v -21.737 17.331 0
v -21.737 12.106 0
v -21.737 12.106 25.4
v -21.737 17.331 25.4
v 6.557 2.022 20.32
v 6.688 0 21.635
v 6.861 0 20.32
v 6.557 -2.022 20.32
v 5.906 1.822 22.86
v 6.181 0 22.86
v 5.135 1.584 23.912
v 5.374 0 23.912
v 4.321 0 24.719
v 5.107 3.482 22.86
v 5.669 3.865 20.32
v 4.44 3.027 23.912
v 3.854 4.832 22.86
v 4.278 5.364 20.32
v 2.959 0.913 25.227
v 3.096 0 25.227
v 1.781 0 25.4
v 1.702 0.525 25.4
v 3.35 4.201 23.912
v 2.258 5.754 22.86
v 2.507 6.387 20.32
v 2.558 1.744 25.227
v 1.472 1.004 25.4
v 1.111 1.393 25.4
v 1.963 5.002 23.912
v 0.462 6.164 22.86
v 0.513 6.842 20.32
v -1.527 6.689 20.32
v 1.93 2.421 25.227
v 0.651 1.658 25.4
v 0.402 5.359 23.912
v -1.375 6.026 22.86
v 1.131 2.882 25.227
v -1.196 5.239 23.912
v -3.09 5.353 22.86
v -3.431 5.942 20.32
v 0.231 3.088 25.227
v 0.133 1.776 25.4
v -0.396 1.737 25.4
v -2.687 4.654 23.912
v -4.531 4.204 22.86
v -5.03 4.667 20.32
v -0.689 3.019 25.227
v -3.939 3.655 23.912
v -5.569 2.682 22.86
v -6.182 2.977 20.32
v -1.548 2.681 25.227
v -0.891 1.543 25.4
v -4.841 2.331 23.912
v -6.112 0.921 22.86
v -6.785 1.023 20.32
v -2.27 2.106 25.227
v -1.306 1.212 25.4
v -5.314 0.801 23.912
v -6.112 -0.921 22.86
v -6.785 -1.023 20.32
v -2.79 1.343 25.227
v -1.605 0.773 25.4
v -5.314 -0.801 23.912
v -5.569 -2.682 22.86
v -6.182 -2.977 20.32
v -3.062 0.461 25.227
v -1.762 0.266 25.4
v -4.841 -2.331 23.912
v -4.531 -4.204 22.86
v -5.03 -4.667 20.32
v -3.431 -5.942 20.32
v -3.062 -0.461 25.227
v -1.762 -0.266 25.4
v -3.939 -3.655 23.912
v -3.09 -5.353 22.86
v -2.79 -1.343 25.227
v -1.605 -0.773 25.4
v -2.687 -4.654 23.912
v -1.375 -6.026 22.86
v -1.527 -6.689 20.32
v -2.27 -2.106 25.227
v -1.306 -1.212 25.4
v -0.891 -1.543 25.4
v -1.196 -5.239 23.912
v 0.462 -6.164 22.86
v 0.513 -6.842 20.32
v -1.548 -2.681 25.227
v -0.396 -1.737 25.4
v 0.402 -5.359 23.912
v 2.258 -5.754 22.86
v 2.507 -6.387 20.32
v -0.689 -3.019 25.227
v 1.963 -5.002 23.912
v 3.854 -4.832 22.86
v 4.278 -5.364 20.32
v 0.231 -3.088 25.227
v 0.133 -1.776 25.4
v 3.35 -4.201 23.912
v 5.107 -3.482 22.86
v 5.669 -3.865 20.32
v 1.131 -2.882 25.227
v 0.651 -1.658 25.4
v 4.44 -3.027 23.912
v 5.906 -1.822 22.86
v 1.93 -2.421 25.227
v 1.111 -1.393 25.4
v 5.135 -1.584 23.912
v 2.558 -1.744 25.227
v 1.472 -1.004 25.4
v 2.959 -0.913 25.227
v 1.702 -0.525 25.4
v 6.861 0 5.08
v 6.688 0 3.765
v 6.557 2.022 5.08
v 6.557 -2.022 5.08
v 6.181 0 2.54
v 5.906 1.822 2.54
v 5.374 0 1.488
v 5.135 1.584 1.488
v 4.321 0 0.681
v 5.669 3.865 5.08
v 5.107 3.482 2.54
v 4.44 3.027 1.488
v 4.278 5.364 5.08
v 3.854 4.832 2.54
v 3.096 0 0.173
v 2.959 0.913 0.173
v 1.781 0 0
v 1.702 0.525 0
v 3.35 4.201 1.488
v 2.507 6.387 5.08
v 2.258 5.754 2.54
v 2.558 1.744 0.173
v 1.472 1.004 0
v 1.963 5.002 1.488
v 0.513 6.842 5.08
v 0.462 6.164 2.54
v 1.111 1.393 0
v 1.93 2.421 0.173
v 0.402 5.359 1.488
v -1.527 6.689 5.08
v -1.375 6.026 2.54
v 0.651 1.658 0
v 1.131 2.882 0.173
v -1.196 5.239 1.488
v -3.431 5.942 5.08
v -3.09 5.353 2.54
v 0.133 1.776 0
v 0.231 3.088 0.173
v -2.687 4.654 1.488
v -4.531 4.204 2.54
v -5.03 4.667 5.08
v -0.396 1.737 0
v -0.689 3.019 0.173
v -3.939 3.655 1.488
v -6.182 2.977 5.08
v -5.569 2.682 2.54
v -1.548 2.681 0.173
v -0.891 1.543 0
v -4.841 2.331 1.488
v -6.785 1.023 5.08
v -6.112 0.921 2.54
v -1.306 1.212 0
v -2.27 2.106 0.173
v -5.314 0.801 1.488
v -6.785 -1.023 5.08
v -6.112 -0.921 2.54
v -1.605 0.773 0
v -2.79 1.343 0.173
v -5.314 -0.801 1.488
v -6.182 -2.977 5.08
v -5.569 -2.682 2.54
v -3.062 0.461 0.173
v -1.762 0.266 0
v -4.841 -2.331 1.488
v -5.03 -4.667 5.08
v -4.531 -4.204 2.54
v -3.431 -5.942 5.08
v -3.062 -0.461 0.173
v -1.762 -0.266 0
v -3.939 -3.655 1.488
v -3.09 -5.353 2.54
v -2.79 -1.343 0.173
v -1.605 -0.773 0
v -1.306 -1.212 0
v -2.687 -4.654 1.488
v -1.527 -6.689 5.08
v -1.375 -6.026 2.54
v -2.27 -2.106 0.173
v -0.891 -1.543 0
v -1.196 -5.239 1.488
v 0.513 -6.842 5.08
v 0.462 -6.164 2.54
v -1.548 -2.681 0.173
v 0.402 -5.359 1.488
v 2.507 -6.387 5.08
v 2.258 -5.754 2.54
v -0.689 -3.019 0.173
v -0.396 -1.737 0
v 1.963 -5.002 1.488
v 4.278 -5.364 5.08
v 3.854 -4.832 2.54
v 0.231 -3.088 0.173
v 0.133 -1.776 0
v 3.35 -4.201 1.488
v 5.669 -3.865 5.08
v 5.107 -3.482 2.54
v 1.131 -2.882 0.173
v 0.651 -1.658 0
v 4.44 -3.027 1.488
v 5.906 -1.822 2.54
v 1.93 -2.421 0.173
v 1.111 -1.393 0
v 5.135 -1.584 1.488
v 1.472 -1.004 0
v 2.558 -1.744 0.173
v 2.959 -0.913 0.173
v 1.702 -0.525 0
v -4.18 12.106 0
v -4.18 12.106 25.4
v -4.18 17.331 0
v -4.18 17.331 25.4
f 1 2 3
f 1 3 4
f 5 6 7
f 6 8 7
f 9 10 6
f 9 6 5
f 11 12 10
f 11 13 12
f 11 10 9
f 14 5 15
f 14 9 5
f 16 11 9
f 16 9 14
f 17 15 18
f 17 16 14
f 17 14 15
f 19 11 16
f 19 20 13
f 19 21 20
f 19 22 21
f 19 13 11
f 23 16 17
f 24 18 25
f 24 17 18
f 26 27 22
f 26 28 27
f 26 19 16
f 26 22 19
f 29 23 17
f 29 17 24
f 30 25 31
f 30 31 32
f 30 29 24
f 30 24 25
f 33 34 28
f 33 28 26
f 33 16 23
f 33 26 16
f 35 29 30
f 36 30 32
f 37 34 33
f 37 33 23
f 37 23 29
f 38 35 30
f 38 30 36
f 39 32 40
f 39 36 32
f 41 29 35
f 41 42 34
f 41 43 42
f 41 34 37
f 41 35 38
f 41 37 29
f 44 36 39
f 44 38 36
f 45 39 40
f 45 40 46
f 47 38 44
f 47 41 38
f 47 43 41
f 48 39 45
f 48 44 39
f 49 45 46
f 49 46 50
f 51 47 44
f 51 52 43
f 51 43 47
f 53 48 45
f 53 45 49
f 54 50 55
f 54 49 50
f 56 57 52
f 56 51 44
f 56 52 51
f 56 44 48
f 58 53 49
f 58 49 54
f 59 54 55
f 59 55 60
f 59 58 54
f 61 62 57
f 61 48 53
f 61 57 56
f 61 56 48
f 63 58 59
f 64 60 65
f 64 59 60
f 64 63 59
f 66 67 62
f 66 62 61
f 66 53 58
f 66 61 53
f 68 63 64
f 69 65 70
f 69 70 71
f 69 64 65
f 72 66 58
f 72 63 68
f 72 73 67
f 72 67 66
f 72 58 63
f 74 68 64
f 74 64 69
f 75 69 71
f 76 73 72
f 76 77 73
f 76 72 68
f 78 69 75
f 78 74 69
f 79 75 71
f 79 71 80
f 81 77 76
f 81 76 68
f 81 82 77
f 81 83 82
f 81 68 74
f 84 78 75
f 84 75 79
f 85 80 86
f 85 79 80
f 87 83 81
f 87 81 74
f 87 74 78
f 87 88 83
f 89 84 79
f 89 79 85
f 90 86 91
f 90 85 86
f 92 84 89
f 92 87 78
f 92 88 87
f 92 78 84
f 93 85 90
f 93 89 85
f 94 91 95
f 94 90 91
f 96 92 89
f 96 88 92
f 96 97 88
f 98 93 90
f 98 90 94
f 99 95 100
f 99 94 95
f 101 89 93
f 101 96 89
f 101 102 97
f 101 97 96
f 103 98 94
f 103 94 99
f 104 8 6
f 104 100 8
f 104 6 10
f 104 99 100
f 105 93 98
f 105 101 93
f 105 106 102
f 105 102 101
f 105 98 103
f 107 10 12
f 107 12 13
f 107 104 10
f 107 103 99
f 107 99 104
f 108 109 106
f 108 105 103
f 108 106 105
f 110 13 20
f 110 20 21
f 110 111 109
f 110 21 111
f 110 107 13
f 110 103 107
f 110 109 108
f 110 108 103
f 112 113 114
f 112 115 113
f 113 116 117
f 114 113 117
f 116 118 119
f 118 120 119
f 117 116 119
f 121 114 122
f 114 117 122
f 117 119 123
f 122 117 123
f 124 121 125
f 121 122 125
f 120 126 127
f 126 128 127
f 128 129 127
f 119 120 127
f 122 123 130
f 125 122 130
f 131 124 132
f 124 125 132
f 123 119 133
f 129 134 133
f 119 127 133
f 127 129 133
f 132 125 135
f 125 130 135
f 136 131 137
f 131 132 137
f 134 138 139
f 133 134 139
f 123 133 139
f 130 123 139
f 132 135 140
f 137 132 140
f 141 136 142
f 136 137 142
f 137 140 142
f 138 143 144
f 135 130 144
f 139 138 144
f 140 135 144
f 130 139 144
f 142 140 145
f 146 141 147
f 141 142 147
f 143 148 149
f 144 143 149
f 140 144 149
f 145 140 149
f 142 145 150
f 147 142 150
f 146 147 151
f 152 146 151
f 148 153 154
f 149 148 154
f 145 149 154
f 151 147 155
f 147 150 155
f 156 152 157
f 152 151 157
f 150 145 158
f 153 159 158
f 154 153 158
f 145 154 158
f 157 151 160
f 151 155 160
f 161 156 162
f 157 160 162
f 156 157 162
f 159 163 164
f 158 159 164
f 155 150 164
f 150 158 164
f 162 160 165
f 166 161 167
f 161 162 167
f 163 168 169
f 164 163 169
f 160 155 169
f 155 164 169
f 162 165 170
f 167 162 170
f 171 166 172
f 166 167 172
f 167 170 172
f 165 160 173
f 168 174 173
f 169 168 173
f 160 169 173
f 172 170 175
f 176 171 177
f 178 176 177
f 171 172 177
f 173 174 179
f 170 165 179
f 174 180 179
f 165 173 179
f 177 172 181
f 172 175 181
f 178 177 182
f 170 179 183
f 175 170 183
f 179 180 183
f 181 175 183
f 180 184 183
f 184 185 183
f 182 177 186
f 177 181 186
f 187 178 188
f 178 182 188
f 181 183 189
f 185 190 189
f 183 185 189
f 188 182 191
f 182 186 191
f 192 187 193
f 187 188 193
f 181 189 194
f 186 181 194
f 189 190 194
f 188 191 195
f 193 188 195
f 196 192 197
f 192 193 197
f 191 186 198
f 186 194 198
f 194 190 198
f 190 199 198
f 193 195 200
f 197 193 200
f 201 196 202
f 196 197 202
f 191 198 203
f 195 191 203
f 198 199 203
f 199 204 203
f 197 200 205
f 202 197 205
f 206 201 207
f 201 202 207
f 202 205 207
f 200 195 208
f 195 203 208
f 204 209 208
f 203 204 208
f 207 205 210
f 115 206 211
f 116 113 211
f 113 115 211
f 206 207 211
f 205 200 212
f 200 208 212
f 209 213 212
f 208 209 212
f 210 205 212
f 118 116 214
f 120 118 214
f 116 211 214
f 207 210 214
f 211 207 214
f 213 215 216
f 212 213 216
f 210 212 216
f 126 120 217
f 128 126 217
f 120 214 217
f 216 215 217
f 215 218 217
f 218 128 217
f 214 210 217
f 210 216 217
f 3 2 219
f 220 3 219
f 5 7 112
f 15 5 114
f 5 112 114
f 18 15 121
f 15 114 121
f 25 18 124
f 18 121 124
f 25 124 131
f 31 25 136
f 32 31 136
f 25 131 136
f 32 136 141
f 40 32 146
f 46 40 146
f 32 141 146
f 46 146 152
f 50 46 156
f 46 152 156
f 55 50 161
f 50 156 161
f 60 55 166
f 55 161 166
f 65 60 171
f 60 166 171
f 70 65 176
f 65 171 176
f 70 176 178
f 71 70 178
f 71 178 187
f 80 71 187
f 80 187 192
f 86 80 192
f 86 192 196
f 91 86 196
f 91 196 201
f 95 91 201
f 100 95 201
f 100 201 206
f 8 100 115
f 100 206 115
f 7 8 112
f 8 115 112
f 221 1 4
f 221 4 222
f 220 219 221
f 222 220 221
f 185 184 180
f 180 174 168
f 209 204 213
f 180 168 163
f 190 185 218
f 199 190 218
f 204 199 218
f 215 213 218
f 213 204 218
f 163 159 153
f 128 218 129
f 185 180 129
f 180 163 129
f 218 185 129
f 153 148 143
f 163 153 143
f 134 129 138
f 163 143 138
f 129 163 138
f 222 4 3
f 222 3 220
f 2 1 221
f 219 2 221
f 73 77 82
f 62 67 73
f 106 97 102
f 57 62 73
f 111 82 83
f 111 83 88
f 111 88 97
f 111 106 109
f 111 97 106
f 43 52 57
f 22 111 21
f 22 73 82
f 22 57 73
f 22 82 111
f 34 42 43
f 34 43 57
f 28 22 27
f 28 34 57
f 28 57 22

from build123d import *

# Parameters (mm, degrees)
F1_W     = 17.5571227446
F1_H     = 5.2252039313
F2_DEPTH = 25.4
F0_R     = 6.8614235902
F3_DEPTH = 25.4
F6_R     = 5.08


# Not quite as in the source:
# - the program builds the solid bodies; features that only make, move or delete a surface that nothing else refers to are left out


with BuildPart() as f2:
    # F1 (on Top) → F2 (new body)
    with BuildSketch(Plane.XY):
        with Locations((-12.9580865614, 14.7183928639)):
            Rectangle(F1_W, F1_H)
    extrude(amount=F2_DEPTH)


with BuildPart() as f3:
    # F0 (on Top) → F3 (new body)
    with BuildSketch(Plane.XY):
        Circle(F0_R)
    extrude(amount=F3_DEPTH)

    # F6
    f6_edges = [f3.edges().sort_by_distance(p)[0] for p in [
        (6.861424, 0, 12.7),
        (-6.861424, 0, 0),
        (-6.861424, 0, 25.4),
    ]]
    fillet(f6_edges, radius=F6_R)


solid = Compound([f2.part, f3.part])
